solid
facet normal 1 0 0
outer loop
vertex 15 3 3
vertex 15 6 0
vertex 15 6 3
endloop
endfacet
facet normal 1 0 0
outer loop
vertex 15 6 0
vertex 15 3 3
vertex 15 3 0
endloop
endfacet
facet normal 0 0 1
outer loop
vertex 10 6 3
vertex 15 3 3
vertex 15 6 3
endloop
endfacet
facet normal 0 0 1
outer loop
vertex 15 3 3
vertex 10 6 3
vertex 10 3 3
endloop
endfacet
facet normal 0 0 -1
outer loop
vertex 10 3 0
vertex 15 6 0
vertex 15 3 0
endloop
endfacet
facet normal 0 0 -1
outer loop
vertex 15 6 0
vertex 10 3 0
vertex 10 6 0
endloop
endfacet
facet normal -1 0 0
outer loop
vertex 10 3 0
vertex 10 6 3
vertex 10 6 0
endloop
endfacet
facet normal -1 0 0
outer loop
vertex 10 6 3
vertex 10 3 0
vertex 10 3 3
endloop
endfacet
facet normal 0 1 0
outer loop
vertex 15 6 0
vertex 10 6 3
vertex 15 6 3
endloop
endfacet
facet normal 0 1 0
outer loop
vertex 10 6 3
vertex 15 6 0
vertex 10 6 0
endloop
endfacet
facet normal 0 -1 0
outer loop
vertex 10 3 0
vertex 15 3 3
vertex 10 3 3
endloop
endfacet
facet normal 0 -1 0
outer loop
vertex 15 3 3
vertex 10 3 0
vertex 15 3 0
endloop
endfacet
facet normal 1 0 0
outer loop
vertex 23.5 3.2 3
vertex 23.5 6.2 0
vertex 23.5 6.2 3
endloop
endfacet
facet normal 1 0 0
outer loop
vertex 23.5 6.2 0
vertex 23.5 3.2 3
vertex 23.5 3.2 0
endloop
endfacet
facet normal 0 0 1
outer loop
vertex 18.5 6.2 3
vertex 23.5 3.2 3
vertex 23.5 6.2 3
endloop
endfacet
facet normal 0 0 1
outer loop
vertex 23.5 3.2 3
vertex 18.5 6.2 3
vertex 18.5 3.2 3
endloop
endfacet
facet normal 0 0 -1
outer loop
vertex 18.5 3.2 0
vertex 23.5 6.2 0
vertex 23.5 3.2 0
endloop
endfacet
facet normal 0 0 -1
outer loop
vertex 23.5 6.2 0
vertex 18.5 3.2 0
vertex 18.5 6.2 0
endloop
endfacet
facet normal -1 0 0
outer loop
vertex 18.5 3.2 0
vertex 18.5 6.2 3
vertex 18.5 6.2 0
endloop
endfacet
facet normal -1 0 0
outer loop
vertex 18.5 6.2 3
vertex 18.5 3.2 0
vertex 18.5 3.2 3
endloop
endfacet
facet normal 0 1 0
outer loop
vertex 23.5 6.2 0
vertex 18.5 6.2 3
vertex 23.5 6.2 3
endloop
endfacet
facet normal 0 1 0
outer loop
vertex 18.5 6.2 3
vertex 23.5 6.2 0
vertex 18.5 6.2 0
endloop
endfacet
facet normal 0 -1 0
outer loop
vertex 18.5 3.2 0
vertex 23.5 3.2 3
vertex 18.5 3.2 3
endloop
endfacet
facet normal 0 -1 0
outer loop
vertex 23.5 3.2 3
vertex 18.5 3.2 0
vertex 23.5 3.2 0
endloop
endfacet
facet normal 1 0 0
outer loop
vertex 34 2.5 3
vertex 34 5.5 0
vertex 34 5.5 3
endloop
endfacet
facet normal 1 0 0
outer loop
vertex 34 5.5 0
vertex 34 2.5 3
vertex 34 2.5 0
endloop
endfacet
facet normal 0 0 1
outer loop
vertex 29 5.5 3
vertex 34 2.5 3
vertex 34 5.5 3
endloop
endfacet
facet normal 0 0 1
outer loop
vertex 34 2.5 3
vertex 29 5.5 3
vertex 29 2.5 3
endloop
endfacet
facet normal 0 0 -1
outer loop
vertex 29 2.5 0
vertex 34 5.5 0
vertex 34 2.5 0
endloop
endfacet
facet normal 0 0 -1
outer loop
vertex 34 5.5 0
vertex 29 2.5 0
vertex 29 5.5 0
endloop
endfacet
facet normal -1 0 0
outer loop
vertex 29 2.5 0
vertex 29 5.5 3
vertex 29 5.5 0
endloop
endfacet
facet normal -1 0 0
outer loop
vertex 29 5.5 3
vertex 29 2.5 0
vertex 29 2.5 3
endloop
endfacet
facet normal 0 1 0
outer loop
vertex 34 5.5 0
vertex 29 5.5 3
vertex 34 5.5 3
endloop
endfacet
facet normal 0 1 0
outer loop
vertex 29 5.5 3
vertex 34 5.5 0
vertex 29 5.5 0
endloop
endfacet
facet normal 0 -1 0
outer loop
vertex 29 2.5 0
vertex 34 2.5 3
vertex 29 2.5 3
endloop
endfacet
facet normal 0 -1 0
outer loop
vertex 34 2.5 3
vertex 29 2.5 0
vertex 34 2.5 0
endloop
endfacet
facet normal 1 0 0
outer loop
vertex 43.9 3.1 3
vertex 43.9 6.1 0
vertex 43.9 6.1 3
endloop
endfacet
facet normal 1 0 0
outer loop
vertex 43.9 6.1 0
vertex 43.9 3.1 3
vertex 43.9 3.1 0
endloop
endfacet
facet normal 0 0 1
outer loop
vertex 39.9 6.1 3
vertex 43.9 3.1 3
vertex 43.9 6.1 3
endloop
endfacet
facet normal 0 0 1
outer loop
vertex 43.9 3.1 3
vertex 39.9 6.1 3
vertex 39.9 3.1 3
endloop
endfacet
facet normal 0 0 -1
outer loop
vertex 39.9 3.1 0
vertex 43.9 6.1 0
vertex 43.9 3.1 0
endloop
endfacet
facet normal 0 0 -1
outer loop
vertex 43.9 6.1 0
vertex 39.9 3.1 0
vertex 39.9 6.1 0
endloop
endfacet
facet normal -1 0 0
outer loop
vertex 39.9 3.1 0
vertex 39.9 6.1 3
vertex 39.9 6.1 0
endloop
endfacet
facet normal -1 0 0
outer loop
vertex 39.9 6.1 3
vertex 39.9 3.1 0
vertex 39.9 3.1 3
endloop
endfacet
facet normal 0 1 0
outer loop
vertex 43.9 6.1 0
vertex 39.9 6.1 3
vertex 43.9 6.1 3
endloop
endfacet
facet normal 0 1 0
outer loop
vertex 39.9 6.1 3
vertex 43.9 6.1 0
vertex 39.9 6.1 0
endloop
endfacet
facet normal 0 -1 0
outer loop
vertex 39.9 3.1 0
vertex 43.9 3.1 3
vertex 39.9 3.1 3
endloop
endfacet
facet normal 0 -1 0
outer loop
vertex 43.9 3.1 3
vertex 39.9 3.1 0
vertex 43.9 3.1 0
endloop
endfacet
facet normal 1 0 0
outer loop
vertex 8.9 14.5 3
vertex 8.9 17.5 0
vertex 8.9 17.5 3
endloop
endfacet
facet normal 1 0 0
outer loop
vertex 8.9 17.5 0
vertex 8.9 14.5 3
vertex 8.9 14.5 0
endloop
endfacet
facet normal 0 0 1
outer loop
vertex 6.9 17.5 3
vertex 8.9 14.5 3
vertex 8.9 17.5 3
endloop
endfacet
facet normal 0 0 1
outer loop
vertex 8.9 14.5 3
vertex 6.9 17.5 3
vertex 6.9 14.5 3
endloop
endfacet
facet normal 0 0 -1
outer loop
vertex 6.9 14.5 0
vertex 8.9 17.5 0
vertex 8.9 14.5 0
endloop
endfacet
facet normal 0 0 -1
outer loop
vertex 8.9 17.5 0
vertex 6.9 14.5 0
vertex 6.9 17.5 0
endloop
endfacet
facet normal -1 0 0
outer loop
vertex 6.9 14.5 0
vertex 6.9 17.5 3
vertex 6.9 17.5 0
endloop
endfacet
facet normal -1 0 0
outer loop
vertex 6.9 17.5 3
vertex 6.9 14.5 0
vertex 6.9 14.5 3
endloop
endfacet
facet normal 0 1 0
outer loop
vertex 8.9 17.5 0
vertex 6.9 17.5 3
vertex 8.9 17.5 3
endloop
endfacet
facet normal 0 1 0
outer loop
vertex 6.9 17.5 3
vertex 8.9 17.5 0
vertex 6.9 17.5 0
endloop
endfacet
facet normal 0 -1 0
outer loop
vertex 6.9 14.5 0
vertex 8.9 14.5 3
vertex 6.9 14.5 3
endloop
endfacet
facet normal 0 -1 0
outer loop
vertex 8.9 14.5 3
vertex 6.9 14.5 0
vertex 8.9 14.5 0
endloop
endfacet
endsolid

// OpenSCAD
// Nametage template for helen.
// 

$fs=0.2;

difference () {
    union () {
        translate ([10,3,0]){cube([5,3,3]);}
        translate ([18.5,3.2,0]){cube([5,3,3]);}
        translate ([29,2.5,0]){cube([5,3,3]);}
        translate ([39.9,3.1,0]){cube([4,3,3]);}

        // and the hat
        translate ([6.9,14.5,0]){cube([2,3,3]);}



        linear_extrude(file = "clare.dxf", 
          height = 7, center = false, convexity = 10,  scale=1);
    }
    translate ([7.5,19.5,-0.1]){ cylinder(h=8,r=1);}
}
